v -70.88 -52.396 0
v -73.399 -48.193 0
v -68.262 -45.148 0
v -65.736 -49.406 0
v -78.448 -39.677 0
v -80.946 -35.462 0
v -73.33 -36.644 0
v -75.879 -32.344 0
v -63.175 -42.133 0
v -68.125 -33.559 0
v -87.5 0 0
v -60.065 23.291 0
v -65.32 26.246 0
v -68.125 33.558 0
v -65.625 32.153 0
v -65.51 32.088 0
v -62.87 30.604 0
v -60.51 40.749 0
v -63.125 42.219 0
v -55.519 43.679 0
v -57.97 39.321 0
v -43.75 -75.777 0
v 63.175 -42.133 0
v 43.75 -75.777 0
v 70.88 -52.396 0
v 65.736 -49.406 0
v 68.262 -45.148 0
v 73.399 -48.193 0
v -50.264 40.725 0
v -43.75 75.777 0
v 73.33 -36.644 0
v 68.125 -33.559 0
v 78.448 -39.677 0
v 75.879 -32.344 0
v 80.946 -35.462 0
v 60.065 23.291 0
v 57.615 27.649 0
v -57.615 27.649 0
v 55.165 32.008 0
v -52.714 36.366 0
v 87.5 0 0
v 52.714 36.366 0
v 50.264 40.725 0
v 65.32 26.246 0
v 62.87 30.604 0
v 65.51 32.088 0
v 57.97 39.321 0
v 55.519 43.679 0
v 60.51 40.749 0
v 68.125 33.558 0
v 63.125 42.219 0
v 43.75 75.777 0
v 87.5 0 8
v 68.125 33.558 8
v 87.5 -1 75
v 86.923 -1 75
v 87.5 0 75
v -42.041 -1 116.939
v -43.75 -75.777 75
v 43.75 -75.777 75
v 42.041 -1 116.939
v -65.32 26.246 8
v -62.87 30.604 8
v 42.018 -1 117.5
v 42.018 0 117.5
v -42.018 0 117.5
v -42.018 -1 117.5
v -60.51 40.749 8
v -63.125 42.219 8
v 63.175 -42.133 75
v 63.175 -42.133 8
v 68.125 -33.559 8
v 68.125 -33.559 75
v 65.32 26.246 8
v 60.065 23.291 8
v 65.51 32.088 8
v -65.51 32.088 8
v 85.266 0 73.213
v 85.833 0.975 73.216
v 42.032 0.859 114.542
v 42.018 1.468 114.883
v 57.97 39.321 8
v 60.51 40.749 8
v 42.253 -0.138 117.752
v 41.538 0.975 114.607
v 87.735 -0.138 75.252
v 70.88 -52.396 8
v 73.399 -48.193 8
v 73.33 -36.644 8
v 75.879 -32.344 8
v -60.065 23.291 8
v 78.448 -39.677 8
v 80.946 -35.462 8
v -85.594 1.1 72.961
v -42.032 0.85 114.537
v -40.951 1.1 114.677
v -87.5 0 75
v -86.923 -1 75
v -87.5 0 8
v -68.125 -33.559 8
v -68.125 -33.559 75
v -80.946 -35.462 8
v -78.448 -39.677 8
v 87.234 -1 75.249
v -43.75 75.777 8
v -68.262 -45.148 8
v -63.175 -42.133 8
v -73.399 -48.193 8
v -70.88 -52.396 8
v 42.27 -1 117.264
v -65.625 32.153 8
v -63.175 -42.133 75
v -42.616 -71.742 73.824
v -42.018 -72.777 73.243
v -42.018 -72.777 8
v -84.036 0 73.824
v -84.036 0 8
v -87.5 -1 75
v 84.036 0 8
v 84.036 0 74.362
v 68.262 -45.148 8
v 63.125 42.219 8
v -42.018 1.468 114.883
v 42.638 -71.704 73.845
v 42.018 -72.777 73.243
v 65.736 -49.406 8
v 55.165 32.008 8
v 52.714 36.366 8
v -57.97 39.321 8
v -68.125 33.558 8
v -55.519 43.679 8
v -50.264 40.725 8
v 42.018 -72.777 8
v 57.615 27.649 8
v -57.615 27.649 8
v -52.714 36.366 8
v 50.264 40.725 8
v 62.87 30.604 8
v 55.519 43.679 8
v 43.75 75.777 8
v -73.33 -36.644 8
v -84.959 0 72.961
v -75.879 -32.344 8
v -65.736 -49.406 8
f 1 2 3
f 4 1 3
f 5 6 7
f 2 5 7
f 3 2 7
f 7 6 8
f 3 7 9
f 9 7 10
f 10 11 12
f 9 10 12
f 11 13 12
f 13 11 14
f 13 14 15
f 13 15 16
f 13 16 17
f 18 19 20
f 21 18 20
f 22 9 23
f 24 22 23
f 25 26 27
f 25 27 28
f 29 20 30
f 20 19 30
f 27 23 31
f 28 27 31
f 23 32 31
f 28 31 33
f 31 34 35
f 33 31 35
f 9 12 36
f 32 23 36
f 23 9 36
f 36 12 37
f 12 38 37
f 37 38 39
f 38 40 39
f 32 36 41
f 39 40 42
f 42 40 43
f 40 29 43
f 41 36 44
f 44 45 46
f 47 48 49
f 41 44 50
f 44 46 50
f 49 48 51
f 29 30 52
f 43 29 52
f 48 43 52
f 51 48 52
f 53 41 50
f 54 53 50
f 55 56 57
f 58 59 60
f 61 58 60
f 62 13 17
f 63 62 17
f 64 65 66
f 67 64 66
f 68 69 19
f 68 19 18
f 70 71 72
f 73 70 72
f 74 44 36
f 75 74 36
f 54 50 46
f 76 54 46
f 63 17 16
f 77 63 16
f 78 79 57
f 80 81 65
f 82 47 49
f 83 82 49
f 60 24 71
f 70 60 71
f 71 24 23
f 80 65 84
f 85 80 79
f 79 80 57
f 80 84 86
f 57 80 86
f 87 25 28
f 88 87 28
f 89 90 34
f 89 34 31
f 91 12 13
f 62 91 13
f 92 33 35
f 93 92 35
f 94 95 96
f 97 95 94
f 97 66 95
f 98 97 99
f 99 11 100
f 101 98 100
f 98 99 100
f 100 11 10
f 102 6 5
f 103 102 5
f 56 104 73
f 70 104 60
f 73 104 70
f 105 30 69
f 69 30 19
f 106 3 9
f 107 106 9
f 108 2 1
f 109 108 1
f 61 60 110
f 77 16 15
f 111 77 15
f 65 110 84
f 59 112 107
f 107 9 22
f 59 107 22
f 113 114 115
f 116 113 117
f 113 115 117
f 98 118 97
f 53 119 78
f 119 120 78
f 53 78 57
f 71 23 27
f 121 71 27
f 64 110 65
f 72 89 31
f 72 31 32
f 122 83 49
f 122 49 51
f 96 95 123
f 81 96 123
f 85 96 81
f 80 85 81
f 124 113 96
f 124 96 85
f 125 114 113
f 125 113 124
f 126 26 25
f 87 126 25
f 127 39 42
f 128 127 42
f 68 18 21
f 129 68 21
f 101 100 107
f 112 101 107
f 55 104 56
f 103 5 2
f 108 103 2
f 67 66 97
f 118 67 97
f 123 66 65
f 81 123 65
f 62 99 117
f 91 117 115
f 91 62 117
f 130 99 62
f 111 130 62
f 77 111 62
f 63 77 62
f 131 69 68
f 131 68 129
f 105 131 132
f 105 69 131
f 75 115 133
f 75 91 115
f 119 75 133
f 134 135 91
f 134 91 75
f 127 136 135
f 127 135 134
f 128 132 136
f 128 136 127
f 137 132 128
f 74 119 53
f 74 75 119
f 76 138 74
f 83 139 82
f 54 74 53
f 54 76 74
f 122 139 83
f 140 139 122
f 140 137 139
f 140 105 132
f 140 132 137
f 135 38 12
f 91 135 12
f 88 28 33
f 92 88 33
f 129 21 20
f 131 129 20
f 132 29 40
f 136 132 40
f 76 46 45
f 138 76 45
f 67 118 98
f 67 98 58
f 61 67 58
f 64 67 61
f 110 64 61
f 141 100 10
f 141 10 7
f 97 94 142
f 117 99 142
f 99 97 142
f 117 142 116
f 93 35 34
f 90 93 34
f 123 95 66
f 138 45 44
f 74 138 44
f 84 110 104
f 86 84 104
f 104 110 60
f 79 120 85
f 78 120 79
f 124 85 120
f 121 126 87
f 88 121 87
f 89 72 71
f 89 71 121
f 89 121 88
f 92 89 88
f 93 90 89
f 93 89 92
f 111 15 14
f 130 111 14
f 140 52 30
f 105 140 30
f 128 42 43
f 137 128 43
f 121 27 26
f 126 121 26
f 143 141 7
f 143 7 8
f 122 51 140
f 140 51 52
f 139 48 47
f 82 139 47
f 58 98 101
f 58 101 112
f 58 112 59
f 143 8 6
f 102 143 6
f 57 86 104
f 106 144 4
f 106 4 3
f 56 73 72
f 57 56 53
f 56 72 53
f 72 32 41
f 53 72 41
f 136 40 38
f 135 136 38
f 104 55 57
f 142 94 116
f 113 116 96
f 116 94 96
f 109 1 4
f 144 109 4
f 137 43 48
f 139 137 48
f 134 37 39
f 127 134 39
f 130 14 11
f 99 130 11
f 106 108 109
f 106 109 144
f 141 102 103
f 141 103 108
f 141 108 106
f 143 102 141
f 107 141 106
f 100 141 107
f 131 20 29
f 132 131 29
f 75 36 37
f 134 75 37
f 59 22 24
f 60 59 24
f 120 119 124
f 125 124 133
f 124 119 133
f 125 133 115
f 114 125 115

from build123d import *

# Parameters (mm, degrees)
F0_W      = 50
F0_H      = 12.5
F1_DEPTH  = 8
F2_DEPTH  = 75
F4_DEPTH  = 8
F7_DEPTH  = 3
F8_DEPTH  = 1
F11_DEPTH = 3
F14_DEPTH = 3
F15_DEPTH = 8
F16_DEPTH = 8
F17_DEPTH = 8


with BuildPart() as f1:
    # F0 (on Top) → F1 (new body)
    with BuildSketch(Plane.XY):
        Polygon((-42.0179491924, 72.7772228311), (-60.5095952989, 40.7487522591), (-57.9695070384, 39.3207329262), (-55.5194165334, 43.6791064608), (-50.2642610162, 40.7248836223), (-52.7144317239, 36.366367418), (-57.615009792, 27.6494680496), (-60.0654171506, 23.2910848888), (-65.3204122546, 26.2455930623), (-62.870004896, 30.6039762231), (-65.5097997054, 32.0881441788), (-84.0358983849, 0), (-42.0179491924, -72.7772228311), (42.0179491924, -72.7772228311), (84.0358983849, 0), (65.5097997054, 32.0881441788), (62.870004896, 30.6039762231), (65.3204122546, 26.2455930623), (60.0654171506, 23.2910848888), (57.615009792, 27.6494680496), (55.164720758, 32.0079177338), (52.7144317239, 36.366367418), (50.2642610162, 40.7248836223), (55.5194165334, 43.6791064608), (57.9695070384, 39.3207329262), (60.5095952989, 40.7487522591), (42.0179491924, 72.7772228311), align=None)
        with Locations((0, 54.5829171234)):
            Rectangle(F0_W, F0_H, mode=Mode.SUBTRACT)
    extrude(amount=F1_DEPTH)

    # F0 (on Top) → F2 (join)
    with BuildSketch(Plane.XY):
        Polygon((68.1246734519, -33.5590499945), (87.5, 0), (84.0358983849, 0), (42.0179491924, -72.7772228311), (-42.0179491924, -72.7772228311), (-84.0358983849, 0), (-87.5, 0), (-68.1246734519, -33.5590499945), (-63.1745123486, -42.1329805311), (-43.75, -75.7772228311), (43.75, -75.7772228311), (63.1745123486, -42.1329805311), align=None)
    extrude(amount=F2_DEPTH)

    # F0 (on Top) → F4 (join)
    with BuildSketch(Plane.XY):
        Polygon((43.75, 75.7772228311), (-43.75, 75.7772228311), (-63.1248363216, 42.2190219338), (-60.5095952989, 40.7487522591), (-42.0179491924, 72.7772228311), (42.0179491924, 72.7772228311), (60.5095952989, 40.7487522591), (63.1248363216, 42.2190219338), align=None)
    extrude(amount=F4_DEPTH)

    # F6 (on face) → F7 (join)
    with BuildSketch(Plane(origin=(0, -50.1312366318, 89.3836679776), x_dir=(1, 0, 0), z_dir=(0, 0.4891706574, -0.872188092))):
        Polygon((43.75, 29.4041920927), (0, 29.4041920927), (-43.75, 29.4041920927), (-42.01795, -57.4775522498), (42.01795, -57.4775522498), align=None)
    extrude(amount=F7_DEPTH)

    # F3 (on Front) → F8 (join)
    with BuildSketch(Plane.XZ):
        Polygon((-42.01795, 114.5), (0, 114.5), (42.01795, 114.5), (84.0359, 75), (87.5, 75), (42.01795, 117.5), (0, 117.5), (-42.01795, 117.5), (-87.5, 75), (-84.0359, 75), align=None)
    extrude(amount=F8_DEPTH)

    # F10 (on face) → F11 (join)
    with BuildSketch(Plane(origin=(-67.6846727043, -39.0777640058, 72.4338274863), x_dir=(0.7723629594, -0.3015876344, 0.5590173143), z_dir=(-0.6351814378, -0.3667221741, 0.6797495039))):
        Polygon((33.2314262259, 55.789645187), (-25.6554603702, 35.6104118215), (30.9888924807, -31.0804218073), align=None)
    extrude(amount=-F11_DEPTH)

    # F13 (on face) → F14 (join)
    with BuildSketch(Plane(origin=(67.6756688636, -39.5950852503, 72.4241918832), x_dir=(0.7733047167, 0.3041472681, -0.556322078), z_dir=(-0.6340345536, 0.3709553614, -0.6785221475))):
        Polygon((-30.939509805, 30.5117392321), (-32.8751652468, -56.3649154418), (25.9400068576, -35.9776056011), align=None)
    extrude(amount=F14_DEPTH)

    # F0 (on Top) → F15 (join)
    with BuildSketch(Plane.XY):
        with Locations((0, 54.5829171234)):
            Rectangle(F0_W, F0_H)
    extrude(amount=F15_DEPTH)

    # F0 (on Top) → F16 (join)
    with BuildSketch(Plane.XY):
        Polygon((-78.4478092981, -39.6772904524), (-73.3299584755, -36.6440801541), (-75.878553621, -32.3439069124), (-80.9460908184, -35.4620099819), align=None)
        Polygon((-63.1745123486, -42.1329805311), (-68.1246734519, -33.5590499945), (-73.3299584755, -36.6440801541), (-78.4478092981, -39.6772904524), (-73.3985163623, -48.1928433322), (-68.2616414678, -45.1481695385), align=None)
        Polygon((-65.7363801019, -49.4055813149), (-68.2616414678, -45.1481695385), (-73.3985163623, -48.1928433322), (-70.880193178, -52.396181094), align=None)
        Polygon((75.878553621, -32.3439069124), (73.3299584755, -36.6440801541), (78.4478092981, -39.6772904524), (80.9460908184, -35.4620099819), align=None)
        Polygon((73.3299584755, -36.6440801541), (68.1246734519, -33.5590499945), (63.1745123486, -42.1329805311), (68.2616414678, -45.1481695385), (73.3985163623, -48.1928433322), (78.4478092981, -39.6772904524), align=None)
        Polygon((73.3985163623, -48.1928433322), (68.2616414678, -45.1481695385), (65.7363801019, -49.4055813149), (70.880193178, -52.396181094), align=None)
    extrude(amount=F16_DEPTH)

    # F0 (on Top) → F17 (join)
    with BuildSketch(Plane.XY):
        Polygon((-65.625, 32.1529130712), (-68.125, 33.5584843966), (-87.5, 0), (-84.0358983849, 0), (-65.5097997054, 32.0881441788), align=None)
        Polygon((87.5, 0), (68.125, 33.5584843966), (65.5097997054, 32.0881441788), (84.0358983849, 0), align=None)
    extrude(amount=F17_DEPTH)


solid = f1.part
